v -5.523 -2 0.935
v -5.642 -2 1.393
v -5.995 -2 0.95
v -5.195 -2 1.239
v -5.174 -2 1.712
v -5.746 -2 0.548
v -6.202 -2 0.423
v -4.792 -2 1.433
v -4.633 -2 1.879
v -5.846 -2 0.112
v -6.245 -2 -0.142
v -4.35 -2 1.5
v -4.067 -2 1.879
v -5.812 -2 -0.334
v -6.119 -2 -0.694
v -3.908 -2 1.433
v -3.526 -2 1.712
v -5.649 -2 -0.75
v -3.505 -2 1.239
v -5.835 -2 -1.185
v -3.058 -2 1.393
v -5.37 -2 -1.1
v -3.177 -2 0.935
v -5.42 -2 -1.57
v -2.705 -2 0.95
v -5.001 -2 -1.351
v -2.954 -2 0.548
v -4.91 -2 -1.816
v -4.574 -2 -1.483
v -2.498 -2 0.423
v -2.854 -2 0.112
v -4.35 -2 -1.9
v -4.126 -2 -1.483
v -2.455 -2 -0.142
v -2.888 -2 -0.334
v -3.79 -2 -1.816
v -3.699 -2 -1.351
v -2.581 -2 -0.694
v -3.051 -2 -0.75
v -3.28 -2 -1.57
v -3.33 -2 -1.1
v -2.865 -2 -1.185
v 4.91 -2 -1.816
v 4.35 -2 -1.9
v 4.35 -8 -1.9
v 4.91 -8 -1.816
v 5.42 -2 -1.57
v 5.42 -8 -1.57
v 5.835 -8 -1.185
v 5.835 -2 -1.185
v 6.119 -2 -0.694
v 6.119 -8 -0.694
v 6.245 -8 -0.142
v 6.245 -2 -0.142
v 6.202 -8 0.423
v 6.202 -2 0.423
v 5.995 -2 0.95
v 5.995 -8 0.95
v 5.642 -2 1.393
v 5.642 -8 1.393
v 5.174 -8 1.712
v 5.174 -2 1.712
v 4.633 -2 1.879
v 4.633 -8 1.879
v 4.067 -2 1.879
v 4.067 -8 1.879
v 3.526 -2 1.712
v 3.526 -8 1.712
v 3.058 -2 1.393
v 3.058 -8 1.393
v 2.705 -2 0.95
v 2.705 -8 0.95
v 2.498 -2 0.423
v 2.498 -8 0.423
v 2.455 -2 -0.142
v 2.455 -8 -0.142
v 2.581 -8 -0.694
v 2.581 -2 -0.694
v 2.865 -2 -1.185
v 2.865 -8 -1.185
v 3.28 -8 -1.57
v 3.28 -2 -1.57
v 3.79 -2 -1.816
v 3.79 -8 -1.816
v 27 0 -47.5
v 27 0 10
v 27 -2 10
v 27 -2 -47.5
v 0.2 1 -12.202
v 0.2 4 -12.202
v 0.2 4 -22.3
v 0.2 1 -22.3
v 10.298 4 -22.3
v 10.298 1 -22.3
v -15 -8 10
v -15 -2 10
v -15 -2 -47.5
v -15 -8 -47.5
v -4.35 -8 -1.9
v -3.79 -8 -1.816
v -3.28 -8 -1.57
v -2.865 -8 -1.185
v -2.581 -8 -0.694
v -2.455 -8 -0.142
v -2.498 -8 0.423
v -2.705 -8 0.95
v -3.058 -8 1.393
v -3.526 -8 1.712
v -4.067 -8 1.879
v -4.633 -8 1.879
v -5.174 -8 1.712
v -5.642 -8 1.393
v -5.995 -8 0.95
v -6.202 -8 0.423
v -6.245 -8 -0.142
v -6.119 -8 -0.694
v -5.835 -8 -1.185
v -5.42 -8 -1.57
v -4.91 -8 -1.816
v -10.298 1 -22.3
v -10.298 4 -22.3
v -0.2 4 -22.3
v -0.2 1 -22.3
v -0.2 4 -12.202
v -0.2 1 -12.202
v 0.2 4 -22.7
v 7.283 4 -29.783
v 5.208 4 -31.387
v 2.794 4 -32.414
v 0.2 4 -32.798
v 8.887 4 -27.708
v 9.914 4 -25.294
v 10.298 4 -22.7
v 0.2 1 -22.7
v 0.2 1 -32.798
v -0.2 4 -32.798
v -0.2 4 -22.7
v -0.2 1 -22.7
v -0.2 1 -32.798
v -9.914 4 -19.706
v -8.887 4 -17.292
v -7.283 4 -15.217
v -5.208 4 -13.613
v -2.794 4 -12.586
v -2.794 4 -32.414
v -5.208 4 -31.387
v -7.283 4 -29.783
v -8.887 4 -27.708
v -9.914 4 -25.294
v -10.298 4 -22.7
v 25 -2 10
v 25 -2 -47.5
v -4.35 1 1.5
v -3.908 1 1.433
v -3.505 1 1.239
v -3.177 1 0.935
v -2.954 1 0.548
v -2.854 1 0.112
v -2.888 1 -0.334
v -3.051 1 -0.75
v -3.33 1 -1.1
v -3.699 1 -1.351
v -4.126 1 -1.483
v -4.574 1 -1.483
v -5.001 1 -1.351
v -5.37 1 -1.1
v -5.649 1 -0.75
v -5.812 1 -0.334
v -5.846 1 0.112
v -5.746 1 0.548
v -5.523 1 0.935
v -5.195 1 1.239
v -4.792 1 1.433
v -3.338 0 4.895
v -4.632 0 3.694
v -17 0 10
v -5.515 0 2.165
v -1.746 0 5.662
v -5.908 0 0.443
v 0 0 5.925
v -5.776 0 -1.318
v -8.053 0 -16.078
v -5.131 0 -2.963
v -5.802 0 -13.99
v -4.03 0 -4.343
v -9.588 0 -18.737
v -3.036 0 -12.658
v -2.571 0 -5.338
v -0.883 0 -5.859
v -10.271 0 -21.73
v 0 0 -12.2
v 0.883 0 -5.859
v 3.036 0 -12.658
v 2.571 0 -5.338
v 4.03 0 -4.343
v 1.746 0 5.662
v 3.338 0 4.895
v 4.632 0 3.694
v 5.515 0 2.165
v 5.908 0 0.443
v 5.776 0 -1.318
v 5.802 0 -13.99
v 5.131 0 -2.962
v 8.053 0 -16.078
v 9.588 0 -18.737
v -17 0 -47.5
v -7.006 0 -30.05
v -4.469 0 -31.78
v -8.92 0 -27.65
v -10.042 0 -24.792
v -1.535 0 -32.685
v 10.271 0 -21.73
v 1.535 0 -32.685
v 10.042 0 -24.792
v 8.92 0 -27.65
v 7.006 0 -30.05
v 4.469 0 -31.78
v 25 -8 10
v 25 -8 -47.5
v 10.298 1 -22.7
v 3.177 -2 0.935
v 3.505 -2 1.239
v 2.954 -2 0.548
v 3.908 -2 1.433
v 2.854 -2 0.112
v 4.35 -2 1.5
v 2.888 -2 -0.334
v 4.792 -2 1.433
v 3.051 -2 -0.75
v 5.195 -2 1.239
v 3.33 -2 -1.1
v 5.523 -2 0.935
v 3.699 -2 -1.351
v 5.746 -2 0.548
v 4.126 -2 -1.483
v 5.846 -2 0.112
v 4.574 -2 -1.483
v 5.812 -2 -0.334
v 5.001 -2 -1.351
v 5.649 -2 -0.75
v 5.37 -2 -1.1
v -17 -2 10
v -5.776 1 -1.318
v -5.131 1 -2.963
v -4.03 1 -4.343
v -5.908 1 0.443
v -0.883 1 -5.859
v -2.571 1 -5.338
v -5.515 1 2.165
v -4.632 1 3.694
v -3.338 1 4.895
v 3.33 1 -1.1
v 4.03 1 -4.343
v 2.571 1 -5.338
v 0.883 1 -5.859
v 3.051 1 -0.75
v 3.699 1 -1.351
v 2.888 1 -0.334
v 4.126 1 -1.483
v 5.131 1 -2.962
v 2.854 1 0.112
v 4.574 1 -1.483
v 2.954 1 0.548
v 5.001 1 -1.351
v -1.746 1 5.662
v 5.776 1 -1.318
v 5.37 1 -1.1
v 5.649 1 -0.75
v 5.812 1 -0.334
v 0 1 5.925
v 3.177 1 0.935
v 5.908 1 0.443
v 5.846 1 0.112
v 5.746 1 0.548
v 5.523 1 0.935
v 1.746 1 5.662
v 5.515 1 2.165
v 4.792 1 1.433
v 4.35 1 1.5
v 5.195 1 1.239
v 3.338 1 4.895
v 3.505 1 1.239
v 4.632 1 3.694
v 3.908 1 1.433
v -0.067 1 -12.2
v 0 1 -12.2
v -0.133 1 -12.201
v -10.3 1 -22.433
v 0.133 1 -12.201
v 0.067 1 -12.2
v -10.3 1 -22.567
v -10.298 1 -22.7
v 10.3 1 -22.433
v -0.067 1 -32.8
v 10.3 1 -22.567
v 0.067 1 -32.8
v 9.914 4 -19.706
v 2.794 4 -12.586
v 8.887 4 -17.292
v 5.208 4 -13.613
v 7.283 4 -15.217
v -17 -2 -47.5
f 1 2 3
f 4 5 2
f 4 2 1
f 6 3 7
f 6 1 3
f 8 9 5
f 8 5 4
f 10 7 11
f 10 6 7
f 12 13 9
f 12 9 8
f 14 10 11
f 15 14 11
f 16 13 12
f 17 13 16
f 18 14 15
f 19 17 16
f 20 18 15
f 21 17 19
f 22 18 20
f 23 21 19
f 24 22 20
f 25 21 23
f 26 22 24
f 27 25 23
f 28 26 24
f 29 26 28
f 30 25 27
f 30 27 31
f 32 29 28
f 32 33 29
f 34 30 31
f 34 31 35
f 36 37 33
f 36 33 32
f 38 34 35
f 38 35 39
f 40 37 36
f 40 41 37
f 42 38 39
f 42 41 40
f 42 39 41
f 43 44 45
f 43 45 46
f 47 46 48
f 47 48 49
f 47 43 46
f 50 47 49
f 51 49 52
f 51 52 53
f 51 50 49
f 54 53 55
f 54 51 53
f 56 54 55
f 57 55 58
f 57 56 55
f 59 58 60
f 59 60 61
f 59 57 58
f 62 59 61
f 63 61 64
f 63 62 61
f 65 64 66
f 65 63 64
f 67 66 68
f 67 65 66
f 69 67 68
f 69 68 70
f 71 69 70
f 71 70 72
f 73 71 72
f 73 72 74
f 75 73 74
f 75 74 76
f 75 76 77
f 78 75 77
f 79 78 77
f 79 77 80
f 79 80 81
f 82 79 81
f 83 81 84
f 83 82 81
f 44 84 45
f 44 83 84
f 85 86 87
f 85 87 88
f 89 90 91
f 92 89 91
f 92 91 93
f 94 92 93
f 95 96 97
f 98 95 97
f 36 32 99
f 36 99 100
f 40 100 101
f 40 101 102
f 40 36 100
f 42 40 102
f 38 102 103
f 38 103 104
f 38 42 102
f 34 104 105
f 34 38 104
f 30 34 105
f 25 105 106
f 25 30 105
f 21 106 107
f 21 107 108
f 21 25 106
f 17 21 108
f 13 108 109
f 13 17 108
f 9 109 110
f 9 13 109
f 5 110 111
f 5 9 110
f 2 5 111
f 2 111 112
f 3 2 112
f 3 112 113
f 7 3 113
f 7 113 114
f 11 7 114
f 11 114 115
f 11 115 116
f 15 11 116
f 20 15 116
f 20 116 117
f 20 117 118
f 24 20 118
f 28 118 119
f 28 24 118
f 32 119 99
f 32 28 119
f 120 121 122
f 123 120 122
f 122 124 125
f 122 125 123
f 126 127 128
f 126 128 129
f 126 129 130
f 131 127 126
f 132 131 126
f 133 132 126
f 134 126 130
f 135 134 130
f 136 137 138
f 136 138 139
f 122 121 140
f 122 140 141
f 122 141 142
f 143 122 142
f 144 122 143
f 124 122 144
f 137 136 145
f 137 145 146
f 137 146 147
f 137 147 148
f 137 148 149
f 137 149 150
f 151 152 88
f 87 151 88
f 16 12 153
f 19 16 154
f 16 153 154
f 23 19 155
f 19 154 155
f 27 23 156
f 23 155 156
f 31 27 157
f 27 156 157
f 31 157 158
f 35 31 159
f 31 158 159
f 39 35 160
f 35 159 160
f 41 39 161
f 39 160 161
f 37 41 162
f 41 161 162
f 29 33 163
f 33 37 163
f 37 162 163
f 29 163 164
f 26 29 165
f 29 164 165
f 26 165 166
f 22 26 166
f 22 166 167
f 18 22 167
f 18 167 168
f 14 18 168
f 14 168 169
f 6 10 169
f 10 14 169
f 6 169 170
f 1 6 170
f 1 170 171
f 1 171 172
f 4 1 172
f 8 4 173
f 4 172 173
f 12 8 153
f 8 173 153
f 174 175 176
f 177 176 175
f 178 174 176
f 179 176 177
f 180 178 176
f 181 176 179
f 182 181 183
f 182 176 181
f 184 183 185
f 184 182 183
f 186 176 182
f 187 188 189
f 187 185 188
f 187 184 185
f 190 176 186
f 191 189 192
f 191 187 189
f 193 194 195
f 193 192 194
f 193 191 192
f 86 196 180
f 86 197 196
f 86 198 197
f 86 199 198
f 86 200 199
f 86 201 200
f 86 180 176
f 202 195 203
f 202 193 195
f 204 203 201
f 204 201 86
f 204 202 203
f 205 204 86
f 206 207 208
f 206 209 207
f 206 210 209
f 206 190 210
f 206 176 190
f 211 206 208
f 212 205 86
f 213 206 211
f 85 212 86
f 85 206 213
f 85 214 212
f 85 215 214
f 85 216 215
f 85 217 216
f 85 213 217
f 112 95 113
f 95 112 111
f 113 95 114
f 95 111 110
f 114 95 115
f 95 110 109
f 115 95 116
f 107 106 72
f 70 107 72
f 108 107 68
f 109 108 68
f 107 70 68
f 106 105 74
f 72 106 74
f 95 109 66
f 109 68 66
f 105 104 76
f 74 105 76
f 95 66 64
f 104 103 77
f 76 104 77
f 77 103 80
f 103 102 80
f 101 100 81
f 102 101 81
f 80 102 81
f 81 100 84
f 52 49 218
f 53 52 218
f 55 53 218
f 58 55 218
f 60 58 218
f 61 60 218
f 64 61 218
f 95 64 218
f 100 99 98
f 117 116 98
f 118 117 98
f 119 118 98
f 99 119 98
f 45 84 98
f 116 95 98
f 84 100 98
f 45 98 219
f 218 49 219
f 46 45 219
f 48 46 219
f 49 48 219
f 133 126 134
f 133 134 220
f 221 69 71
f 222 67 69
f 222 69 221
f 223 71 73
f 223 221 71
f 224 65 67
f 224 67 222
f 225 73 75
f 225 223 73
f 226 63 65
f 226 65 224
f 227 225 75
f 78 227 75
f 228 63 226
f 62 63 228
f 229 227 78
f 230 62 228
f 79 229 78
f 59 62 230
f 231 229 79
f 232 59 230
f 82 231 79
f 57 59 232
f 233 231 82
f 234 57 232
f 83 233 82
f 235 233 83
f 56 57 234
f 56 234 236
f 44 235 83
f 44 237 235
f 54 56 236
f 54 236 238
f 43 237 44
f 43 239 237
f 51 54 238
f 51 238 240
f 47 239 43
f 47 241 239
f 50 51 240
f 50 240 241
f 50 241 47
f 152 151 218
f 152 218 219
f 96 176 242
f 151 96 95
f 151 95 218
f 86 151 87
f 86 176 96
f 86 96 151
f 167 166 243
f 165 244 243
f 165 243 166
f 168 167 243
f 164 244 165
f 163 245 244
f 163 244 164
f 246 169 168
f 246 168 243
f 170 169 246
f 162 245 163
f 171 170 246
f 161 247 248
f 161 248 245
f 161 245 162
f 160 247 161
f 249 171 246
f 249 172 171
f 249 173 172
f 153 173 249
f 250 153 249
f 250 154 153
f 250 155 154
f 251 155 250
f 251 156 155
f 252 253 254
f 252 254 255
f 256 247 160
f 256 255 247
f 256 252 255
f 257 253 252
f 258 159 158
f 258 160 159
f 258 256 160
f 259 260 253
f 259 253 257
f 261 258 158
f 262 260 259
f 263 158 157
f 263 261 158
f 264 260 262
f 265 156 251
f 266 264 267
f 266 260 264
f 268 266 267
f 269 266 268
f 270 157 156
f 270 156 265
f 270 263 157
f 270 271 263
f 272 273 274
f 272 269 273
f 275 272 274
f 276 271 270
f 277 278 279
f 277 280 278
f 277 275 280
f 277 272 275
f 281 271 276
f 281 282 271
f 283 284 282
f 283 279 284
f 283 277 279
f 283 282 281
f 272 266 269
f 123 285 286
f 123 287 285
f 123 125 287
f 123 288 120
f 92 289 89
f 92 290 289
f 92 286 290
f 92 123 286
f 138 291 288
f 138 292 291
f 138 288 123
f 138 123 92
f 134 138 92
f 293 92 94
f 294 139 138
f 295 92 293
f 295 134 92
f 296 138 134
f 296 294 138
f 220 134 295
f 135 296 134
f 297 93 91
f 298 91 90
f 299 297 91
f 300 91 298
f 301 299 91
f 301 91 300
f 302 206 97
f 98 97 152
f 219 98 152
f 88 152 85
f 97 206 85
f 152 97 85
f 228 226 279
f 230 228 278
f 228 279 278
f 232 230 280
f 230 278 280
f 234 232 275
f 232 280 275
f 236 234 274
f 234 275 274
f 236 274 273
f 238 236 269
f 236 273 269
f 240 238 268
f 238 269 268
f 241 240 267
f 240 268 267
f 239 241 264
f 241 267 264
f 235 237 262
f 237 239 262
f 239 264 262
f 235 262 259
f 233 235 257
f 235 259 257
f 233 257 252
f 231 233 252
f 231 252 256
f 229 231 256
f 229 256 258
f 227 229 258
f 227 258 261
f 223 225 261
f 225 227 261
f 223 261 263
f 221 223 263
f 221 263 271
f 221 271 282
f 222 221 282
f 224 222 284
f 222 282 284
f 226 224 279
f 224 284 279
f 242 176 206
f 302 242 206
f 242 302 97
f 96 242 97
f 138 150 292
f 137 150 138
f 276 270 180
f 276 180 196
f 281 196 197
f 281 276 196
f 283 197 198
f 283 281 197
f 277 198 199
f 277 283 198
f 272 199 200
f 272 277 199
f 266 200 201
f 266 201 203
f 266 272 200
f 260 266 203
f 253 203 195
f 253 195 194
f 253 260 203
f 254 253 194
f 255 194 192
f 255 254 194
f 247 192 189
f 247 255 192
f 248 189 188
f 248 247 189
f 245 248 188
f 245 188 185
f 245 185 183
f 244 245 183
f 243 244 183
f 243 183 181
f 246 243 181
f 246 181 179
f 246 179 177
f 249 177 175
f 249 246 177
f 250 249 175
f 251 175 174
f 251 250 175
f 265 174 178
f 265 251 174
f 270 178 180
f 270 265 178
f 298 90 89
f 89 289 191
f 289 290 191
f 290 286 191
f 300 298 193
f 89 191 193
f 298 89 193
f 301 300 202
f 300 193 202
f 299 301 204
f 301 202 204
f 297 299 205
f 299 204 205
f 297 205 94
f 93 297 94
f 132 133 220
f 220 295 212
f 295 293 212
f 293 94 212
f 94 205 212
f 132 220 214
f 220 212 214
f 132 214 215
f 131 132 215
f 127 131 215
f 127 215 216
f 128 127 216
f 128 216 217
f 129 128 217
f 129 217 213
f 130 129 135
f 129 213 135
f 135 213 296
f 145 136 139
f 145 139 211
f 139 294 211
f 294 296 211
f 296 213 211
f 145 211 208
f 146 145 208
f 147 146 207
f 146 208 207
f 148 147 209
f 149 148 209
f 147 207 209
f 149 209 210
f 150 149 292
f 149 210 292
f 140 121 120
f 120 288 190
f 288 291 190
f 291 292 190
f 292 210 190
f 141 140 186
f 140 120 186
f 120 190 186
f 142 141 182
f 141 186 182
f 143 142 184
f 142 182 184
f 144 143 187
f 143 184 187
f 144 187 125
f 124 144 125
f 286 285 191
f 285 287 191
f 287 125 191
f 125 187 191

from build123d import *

# Parameters (mm, degrees)
SKETCH1_W               = 40
SKETCH1_H               = 57.5
SKETCH1_R               = 1.5
BOSS_EXTRUDE1_DEPTH     = 8
SKETCH1_3_W             = 2
SKETCH1_3_H             = 57.5
BOSS_EXTRUDE2_DEPTH     = 2
SKETCH1_4_R             = 10.3
BOSS_EXTRUDE3_DEPTH     = 4
BOSS_EXTRUDE4_START     = 1
SKETCH1_5_R             = 5.925
SKETCH1_5_R_2           = 1.5
BOSS_EXTRUDE4_DEPTH     = 1
CUT_EXTRUDE1_START      = -6
SKETCH2_R               = 1.9
SKETCH2_R_2             = 1.5
CUT_EXTRUDE1_DEPTH      = 6
SKETCH3_W               = 0.4
SKETCH3_H               = 20.6
SKETCH3_W_2             = 20.6
SKETCH3_H_2             = 0.4
CUT_EXTRUDE_THIN1_DEPTH = 3


with BuildPart() as part:
    # Sketch1 → Boss-Extrude1 (new body)
    with BuildSketch(Plane(origin=(0, 0, 0), x_dir=(1, 0, 0), z_dir=(0, 1, 0))):
        with Locations((5, 18.75)):
            Rectangle(SKETCH1_W, SKETCH1_H)
        with Locations((4.35, 0)):
            Circle(SKETCH1_R, mode=Mode.SUBTRACT)
        with Locations((-4.35, 0)):
            Circle(SKETCH1_R, mode=Mode.SUBTRACT)
    extrude(amount=-BOSS_EXTRUDE1_DEPTH)

    # Sketch1<3> → Boss-Extrude2 (add)
    with BuildSketch(Plane(origin=(0, 0, 0), x_dir=(1, 0, 0), z_dir=(0, 1, 0))):
        with Locations((-16, 18.75)):
            Rectangle(SKETCH1_3_W, SKETCH1_3_H)
        with Locations((26, 18.75)):
            Rectangle(SKETCH1_3_W, SKETCH1_3_H)
    extrude(amount=-BOSS_EXTRUDE2_DEPTH)

    # Sketch1<4> → Boss-Extrude3 (add)
    with BuildSketch(Plane(origin=(0, 0, 0), x_dir=(1, 0, 0), z_dir=(0, 1, 0))):
        with Locations((0, 22.5)):
            Circle(SKETCH1_4_R)
    extrude(amount=BOSS_EXTRUDE3_DEPTH)

    # Sketch1<5> → Boss-Extrude4 (add)
    with BuildSketch(Plane(origin=(0, 0, 0), x_dir=(1, 0, 0), z_dir=(0, 1, 0)).offset(BOSS_EXTRUDE4_START)):
        Circle(SKETCH1_5_R)
        with Locations((-4.35, 0)):
            Circle(SKETCH1_5_R_2, mode=Mode.SUBTRACT)
        with Locations((4.35, 0)):
            Circle(SKETCH1_5_R_2, mode=Mode.SUBTRACT)
    extrude(amount=-BOSS_EXTRUDE4_DEPTH)

    # Sketch2 → Cut-Extrude1 (cut)
    # profile 1 of 2: a face of its own
    with BuildSketch(Plane.XZ.offset(8).offset(CUT_EXTRUDE1_START)):
        with Locations((-4.35, 0)):
            Circle(SKETCH2_R)
        with Locations((-4.35, 0)):
            Circle(SKETCH2_R_2, mode=Mode.SUBTRACT)
    # profile 2 of 2: a face of its own
    with BuildSketch(Plane.XZ.offset(8).offset(CUT_EXTRUDE1_START)):
        with Locations((4.35, 0)):
            Circle(SKETCH2_R)
        with Locations((4.35, 0)):
            Circle(SKETCH2_R_2, mode=Mode.SUBTRACT)
    extrude(amount=CUT_EXTRUDE1_DEPTH, mode=Mode.SUBTRACT)

    # Sketch3 → Cut-Extrude-Thin1 (cut)
    with BuildSketch(Plane(origin=(0, 4, 0), x_dir=(1, 0, 0), z_dir=(0, 1, 0))):
        with Locations((0, 22.5)):
            Rectangle(SKETCH3_W, SKETCH3_H)
        with Locations((0, 22.5)):
            Rectangle(SKETCH3_W_2, SKETCH3_H_2)
    extrude(amount=-CUT_EXTRUDE_THIN1_DEPTH, mode=Mode.SUBTRACT)


solid = part.part
